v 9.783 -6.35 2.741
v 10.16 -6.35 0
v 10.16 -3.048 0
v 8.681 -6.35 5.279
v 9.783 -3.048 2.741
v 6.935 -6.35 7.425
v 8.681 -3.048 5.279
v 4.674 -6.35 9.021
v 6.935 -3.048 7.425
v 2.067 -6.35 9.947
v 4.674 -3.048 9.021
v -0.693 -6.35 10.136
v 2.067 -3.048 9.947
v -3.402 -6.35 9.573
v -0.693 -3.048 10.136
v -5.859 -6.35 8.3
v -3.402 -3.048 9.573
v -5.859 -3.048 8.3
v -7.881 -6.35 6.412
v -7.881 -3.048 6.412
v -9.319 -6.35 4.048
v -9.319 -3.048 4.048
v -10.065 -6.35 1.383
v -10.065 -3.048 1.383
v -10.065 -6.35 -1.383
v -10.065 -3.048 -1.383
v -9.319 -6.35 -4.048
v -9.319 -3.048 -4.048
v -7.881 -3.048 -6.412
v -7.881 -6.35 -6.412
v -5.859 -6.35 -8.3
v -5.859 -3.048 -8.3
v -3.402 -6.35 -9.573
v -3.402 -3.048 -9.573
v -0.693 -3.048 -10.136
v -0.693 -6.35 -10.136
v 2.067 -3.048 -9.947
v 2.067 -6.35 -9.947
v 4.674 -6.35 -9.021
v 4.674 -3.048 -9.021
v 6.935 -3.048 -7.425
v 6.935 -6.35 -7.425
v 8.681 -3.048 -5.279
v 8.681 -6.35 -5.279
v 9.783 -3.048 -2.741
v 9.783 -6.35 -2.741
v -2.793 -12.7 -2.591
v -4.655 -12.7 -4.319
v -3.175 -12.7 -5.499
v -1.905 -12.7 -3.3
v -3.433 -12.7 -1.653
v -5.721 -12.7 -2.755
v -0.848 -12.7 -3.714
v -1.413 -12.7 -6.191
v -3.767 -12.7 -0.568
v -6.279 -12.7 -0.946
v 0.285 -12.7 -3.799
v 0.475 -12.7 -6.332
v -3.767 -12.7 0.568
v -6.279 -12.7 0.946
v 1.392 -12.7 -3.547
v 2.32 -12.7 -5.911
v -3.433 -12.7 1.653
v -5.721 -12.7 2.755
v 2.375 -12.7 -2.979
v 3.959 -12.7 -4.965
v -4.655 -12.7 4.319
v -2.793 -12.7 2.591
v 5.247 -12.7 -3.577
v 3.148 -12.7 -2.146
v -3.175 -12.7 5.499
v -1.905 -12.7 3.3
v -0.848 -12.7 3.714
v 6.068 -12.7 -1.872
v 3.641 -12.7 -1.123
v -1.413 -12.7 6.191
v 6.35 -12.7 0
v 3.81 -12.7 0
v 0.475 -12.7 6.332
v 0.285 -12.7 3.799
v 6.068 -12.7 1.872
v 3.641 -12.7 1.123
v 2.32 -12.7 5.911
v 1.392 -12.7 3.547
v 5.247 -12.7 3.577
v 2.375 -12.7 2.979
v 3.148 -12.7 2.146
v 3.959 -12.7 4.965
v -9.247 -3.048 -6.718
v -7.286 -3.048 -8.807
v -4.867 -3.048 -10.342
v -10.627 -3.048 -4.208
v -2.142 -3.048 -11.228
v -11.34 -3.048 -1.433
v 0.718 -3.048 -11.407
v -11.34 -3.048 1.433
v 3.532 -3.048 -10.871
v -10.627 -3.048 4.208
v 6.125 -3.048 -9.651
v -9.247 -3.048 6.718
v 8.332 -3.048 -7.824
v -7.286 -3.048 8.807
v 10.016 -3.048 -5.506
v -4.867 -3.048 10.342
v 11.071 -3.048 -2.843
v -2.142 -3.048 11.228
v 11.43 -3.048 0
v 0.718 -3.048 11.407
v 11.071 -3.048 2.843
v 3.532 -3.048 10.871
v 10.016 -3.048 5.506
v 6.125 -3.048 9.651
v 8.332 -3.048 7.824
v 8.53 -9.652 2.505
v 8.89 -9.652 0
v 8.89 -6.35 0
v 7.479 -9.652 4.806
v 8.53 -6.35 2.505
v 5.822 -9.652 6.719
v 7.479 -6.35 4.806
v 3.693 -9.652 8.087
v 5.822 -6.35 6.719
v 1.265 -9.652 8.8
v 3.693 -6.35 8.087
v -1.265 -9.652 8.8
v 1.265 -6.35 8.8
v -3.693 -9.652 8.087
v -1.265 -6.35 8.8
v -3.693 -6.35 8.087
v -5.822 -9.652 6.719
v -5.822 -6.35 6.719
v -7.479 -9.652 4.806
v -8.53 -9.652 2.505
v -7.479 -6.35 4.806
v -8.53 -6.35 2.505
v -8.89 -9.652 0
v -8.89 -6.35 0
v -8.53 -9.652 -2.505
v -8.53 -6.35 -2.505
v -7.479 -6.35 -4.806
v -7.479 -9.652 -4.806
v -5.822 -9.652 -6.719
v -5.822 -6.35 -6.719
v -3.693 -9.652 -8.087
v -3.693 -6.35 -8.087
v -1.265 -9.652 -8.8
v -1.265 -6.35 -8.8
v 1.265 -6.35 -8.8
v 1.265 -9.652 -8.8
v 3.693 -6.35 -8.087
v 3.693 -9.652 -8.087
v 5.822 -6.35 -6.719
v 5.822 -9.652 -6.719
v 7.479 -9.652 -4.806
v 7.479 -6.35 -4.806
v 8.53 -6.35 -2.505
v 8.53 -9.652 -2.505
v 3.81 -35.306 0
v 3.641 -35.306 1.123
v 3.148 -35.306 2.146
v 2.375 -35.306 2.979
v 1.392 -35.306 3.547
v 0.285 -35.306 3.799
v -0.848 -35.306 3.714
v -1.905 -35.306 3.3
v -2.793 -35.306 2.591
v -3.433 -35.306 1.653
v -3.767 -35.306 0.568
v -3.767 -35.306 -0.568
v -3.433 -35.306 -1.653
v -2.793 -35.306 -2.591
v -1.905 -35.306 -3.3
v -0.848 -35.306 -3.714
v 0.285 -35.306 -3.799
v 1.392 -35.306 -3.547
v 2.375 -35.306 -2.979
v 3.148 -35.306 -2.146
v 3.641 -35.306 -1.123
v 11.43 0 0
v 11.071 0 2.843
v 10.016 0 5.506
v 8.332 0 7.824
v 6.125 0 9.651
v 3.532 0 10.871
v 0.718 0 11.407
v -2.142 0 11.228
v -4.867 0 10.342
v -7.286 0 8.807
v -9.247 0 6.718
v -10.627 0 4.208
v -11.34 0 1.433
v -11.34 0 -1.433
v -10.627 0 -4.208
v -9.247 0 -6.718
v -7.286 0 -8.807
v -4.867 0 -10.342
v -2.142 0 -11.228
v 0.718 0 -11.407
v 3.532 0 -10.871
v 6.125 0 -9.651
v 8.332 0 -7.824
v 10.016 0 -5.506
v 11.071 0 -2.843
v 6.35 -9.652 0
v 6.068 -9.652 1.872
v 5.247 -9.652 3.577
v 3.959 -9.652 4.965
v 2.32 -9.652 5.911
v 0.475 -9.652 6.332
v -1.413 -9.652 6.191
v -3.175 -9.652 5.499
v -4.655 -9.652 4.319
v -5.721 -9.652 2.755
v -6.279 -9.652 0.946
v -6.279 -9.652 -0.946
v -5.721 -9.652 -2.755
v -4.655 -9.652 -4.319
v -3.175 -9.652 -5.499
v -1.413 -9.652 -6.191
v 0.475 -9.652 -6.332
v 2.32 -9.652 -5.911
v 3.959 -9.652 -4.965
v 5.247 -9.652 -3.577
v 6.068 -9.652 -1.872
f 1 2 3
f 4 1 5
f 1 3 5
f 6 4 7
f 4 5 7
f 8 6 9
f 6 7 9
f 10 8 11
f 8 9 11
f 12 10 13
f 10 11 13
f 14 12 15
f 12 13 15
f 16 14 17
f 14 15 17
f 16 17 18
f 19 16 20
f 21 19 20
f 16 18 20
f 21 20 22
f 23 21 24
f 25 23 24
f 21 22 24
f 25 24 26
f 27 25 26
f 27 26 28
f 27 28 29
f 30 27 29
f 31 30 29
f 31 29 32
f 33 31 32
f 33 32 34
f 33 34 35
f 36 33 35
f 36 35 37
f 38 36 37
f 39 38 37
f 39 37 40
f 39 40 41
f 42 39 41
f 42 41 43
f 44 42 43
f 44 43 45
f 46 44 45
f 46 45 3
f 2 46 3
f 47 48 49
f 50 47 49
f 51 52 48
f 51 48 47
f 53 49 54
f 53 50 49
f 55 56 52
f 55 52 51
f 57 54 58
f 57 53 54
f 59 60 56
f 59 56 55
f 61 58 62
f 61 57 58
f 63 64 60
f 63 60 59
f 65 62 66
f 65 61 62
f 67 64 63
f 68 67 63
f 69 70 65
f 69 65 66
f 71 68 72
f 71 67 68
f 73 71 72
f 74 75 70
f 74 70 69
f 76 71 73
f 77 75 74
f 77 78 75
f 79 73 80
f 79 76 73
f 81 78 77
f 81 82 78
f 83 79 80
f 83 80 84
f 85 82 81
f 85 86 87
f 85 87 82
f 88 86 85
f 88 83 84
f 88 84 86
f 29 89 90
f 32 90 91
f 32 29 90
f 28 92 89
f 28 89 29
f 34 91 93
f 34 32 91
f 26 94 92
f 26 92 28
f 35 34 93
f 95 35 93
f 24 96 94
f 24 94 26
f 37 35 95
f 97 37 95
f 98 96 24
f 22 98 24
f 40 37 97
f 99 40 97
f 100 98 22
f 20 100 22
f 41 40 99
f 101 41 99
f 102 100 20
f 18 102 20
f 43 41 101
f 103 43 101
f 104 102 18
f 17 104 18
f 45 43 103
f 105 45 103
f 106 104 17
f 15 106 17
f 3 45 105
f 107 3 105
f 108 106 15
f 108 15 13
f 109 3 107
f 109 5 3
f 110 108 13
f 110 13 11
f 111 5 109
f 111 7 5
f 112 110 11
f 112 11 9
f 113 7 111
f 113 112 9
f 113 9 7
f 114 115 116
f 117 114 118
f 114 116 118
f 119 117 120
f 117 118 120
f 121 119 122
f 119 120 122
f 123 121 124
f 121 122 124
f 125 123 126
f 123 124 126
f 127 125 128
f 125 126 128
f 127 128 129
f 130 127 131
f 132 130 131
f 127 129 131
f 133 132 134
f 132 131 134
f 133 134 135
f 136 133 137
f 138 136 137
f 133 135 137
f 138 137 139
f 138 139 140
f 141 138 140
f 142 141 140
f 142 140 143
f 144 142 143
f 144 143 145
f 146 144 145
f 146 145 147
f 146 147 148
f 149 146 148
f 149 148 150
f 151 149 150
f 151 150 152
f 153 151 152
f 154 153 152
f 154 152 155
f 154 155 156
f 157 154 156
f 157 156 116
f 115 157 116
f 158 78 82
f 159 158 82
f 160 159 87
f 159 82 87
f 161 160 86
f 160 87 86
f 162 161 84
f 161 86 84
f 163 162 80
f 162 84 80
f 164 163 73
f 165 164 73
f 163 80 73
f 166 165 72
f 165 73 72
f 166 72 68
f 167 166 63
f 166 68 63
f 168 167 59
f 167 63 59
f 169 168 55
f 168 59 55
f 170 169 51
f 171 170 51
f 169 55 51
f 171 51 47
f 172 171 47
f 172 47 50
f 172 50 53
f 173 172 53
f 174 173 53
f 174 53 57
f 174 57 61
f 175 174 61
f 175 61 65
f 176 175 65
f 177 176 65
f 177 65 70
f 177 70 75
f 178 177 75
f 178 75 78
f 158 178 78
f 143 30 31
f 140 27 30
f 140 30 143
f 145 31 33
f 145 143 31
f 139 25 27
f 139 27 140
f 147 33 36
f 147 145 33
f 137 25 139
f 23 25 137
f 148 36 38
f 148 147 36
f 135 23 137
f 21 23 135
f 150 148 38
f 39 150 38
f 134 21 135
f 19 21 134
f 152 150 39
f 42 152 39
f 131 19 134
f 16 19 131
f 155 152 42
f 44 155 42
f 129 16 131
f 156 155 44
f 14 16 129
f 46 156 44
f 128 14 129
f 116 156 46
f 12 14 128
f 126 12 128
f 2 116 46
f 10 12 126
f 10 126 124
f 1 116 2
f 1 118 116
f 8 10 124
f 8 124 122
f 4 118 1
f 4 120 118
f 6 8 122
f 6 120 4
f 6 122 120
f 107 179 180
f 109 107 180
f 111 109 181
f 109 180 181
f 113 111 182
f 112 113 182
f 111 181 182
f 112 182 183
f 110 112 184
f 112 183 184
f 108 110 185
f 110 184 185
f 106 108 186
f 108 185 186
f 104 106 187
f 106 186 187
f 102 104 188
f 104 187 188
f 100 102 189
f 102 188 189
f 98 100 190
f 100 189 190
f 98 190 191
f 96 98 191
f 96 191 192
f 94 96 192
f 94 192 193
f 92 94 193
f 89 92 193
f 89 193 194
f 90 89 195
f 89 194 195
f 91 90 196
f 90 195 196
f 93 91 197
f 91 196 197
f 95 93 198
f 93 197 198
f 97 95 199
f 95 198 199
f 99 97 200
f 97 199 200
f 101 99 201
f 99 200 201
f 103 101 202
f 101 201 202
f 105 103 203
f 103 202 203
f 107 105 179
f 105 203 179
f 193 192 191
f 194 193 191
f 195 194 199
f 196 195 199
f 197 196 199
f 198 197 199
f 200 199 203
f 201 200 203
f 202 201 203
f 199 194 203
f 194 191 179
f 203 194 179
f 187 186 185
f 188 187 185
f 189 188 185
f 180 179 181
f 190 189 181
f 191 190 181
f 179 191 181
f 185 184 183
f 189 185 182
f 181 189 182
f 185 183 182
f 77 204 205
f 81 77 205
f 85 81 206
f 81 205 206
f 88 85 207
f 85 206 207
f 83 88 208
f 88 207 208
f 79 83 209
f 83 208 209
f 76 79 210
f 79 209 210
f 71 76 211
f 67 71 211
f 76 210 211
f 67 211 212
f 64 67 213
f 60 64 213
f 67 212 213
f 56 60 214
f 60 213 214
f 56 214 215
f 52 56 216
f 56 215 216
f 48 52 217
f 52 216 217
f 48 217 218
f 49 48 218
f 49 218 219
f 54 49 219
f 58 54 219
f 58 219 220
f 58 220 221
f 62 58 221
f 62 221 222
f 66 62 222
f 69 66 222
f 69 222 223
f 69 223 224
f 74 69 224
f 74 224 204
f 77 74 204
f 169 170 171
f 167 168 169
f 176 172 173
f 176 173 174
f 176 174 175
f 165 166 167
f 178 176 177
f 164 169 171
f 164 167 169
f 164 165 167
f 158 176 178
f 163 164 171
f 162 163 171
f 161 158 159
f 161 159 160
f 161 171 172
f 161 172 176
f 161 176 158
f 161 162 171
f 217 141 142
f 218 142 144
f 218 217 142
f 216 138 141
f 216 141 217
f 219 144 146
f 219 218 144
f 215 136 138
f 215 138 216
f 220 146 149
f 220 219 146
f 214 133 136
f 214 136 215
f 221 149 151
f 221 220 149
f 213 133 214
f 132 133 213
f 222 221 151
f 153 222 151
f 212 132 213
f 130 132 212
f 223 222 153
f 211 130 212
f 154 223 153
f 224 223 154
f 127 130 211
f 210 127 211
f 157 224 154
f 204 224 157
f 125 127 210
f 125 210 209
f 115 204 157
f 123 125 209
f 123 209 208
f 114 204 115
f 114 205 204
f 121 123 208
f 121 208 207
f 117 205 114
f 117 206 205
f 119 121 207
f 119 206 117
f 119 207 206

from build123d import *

# Parameters (mm, degrees)
F0_R     = 3.81
F1_DEPTH = 35.306
F2_R     = 6.35
F3_DEPTH = 12.7
F4_R     = 8.89
F5_DEPTH = 9.652
F6_R     = 10.16
F7_DEPTH = 6.35
F8_R     = 11.43
F9_DEPTH = 3.048


# Not quite as in the source:
# - the program builds the solid bodies; features that only make, move or delete a surface that nothing else refers to are left out


with BuildPart() as f1:
    # F0 (on Front) → F1 (new body)
    with BuildSketch(Plane.XZ):
        Circle(F0_R)
    extrude(amount=F1_DEPTH)

    # F2 (on Front) → F3 (join)
    with BuildSketch(Plane.XZ):
        Circle(F2_R)
    extrude(amount=F3_DEPTH)

    # F4 (on Front) → F5 (join)
    with BuildSketch(Plane.XZ):
        Circle(F4_R)
    extrude(amount=F5_DEPTH)

    # F6 (on Front) → F7 (join)
    with BuildSketch(Plane.XZ):
        Circle(F6_R)
    extrude(amount=F7_DEPTH)

    # F8 (on Front) → F9 (join)
    with BuildSketch(Plane.XZ):
        Circle(F8_R)
    extrude(amount=F9_DEPTH)


solid = f1.part
